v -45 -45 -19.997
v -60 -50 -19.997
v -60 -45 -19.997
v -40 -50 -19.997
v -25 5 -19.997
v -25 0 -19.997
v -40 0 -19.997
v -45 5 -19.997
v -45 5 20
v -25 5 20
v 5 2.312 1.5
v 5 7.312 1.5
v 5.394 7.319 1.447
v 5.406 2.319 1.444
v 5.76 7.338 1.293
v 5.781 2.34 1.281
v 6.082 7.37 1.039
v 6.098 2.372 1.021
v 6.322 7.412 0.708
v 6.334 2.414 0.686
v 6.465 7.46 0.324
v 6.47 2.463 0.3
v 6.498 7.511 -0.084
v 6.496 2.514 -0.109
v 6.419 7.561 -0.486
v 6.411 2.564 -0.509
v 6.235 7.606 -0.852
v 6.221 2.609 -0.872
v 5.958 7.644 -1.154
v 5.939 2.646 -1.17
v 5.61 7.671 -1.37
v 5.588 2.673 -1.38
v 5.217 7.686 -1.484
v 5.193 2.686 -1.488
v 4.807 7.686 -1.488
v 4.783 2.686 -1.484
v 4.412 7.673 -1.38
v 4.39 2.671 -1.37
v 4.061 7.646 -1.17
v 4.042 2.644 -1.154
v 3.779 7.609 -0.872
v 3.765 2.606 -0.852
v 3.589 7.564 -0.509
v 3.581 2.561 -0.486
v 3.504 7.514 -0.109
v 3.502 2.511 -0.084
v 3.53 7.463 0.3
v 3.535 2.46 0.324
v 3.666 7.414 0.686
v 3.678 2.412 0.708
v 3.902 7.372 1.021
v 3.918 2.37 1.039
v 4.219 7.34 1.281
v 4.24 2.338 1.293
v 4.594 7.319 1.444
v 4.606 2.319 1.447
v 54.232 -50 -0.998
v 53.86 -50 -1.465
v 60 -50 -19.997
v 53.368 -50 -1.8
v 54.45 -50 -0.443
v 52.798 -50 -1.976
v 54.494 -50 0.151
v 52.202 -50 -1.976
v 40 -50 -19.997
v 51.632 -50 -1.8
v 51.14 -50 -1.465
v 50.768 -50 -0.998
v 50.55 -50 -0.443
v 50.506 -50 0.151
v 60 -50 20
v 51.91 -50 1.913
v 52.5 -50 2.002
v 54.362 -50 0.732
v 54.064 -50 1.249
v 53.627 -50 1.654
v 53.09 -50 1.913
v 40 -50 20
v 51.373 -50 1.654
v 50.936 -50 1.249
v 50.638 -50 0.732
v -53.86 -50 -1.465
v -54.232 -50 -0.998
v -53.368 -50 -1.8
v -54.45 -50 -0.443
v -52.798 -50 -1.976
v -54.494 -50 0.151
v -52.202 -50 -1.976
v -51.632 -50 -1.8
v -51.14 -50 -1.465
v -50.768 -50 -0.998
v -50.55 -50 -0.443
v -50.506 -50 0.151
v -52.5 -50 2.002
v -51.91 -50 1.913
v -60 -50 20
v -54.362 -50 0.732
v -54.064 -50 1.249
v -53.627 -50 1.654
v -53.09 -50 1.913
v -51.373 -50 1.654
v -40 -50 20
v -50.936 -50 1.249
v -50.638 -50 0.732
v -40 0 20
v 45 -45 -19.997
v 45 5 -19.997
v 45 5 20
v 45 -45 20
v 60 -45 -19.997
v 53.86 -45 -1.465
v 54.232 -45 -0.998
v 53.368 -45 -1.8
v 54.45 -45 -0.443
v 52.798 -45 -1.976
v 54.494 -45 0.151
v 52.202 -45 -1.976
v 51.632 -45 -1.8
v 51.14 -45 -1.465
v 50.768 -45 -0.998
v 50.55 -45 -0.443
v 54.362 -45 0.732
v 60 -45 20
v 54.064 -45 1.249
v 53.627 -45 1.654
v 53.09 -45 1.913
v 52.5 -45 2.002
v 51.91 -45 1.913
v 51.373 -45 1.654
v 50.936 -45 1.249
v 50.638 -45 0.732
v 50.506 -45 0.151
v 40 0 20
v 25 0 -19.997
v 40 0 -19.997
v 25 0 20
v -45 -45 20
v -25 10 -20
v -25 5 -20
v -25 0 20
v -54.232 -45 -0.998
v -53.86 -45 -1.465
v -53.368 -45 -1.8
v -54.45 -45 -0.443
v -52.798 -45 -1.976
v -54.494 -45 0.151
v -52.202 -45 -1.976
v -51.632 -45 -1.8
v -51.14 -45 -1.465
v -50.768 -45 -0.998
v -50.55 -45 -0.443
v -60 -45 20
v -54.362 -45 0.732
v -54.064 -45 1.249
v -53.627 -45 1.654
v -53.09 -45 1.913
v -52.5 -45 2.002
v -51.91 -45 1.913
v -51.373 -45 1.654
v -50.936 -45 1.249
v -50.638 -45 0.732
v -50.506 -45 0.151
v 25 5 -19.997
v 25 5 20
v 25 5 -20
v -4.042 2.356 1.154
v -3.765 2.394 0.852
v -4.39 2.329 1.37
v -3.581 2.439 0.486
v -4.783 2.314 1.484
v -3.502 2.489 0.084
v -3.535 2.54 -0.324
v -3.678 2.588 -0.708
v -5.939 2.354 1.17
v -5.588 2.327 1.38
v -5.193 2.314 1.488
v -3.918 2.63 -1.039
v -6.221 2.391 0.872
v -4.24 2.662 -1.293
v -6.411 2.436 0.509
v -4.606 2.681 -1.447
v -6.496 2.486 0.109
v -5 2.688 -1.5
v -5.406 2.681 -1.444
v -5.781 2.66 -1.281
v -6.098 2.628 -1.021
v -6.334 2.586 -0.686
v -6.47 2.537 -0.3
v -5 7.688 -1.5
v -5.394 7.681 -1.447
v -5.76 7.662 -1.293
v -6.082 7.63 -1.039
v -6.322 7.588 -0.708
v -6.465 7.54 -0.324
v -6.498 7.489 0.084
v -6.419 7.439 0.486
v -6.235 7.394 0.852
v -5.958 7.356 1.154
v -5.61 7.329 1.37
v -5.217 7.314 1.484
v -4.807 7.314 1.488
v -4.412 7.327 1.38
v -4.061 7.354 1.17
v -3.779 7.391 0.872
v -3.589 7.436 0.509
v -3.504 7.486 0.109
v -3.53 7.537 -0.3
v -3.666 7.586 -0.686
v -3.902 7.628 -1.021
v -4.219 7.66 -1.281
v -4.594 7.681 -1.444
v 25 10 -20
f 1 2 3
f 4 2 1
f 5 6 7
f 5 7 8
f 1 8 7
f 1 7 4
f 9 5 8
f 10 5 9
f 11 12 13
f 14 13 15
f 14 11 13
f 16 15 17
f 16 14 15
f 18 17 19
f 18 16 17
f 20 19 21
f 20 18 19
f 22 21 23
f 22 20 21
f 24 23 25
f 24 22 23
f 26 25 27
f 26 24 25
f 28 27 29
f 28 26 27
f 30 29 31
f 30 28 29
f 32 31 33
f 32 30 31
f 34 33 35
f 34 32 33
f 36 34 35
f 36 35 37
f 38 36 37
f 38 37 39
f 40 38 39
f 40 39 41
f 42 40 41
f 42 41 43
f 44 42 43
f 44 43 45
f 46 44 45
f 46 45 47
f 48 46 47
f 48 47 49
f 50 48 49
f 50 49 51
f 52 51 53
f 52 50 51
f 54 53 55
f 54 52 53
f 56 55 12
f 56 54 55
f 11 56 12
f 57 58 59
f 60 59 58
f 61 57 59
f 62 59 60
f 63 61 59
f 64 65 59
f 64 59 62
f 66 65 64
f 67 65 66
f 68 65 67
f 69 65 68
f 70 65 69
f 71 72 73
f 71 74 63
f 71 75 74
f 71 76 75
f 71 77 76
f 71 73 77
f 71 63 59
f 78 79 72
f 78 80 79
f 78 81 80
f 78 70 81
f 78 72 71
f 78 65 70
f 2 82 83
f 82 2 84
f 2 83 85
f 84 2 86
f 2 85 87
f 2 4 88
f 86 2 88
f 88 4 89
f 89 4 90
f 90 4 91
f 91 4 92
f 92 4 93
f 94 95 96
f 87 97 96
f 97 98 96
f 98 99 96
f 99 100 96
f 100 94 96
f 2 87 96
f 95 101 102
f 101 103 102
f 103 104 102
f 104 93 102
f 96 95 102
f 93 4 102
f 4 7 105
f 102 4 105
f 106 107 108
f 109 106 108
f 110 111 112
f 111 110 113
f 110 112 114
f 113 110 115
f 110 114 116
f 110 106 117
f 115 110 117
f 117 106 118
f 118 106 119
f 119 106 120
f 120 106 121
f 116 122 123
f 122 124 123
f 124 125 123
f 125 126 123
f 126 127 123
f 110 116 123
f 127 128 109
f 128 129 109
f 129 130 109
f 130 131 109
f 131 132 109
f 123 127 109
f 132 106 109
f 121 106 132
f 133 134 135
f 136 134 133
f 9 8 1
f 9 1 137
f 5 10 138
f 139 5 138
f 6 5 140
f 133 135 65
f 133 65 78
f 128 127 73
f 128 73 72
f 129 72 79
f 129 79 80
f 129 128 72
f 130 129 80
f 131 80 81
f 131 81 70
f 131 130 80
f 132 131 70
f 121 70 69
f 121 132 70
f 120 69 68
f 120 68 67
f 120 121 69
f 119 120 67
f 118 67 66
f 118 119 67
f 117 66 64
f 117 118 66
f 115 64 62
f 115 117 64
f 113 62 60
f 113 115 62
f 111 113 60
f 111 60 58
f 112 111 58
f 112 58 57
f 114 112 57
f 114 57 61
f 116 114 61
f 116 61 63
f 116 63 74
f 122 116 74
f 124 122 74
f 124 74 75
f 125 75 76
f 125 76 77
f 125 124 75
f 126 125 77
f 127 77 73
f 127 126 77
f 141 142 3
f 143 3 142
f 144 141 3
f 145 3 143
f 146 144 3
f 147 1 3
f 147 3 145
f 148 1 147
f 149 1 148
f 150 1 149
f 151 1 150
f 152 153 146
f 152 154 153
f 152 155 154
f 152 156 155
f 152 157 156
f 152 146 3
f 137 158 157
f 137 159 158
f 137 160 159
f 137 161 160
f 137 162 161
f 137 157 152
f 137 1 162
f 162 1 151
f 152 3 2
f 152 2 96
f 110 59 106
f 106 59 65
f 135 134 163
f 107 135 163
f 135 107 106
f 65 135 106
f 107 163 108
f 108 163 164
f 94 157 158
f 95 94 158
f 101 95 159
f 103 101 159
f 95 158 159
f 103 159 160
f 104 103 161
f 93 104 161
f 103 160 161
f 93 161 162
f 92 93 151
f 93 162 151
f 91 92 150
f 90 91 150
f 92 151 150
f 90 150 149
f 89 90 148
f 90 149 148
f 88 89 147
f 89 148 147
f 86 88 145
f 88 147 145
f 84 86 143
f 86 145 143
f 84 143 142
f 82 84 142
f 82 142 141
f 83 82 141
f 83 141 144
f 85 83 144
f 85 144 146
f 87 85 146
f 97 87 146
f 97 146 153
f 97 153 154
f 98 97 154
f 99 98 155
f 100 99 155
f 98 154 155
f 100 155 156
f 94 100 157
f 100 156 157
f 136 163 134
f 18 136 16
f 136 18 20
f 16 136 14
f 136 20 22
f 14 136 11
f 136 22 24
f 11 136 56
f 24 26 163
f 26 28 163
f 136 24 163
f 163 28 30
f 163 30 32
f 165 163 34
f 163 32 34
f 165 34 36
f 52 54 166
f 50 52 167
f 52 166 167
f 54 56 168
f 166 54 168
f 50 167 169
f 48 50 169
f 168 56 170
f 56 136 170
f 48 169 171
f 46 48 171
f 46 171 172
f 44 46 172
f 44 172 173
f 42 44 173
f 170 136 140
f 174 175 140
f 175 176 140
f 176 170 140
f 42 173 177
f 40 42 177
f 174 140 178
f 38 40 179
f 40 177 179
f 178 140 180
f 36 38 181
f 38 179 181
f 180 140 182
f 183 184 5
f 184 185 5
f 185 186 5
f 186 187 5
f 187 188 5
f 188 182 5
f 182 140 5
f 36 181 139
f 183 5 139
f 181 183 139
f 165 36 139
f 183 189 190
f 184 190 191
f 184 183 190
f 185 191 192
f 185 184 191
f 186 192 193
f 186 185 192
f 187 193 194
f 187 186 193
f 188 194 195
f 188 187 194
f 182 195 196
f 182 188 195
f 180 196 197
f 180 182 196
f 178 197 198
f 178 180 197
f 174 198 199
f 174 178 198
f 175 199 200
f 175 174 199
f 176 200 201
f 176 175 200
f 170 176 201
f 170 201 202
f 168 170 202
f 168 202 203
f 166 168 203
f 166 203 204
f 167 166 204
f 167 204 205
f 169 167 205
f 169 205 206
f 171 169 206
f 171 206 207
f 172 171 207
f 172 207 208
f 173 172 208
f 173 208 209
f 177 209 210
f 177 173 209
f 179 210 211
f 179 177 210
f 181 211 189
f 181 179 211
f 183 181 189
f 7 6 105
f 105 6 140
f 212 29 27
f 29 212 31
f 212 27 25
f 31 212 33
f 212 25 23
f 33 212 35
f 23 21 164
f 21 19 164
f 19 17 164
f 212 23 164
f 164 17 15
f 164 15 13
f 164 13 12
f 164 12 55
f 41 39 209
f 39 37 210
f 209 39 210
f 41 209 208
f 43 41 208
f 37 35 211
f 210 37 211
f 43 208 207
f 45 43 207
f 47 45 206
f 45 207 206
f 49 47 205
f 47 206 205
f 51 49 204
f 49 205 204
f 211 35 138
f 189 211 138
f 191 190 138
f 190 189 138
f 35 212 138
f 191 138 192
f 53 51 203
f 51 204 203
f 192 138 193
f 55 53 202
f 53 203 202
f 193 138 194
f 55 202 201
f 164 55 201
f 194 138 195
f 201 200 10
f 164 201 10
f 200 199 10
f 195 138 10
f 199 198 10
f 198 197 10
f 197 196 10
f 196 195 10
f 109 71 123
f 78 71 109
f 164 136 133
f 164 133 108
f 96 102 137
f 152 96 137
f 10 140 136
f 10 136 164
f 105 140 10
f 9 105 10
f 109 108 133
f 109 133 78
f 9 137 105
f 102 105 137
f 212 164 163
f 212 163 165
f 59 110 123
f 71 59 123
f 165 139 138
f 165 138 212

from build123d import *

# Parameters (mm, degrees)
SKETCH1_W           = 50
SKETCH1_H           = 40
SKETCH1_R           = 1.5
BOSS_EXTRUDE1_DEPTH = 10
CUT_EXTRUDE2_DEPTH  = 50
SKETCH4_W           = 39.996802558
SKETCH4_H           = 5
BOSS_EXTRUDE2_DEPTH = 20
SKETCH5_W           = 5
SKETCH5_H           = 39.996802558
BOSS_EXTRUDE3_DEPTH = 50
SKETCH6_W           = 39.996802558
SKETCH6_H           = 5
BOSS_EXTRUDE4_DEPTH = 15
SKETCH9_R           = 2
CUT_EXTRUDE6_DEPTH  = 5


with BuildPart() as part:
    # Sketch1 → Boss-Extrude1 (new body)
    with BuildSketch(Plane(origin=(0, 0, 0), x_dir=(1, 0, 0), z_dir=(0, 1, 0))):
        Rectangle(SKETCH1_W, SKETCH1_H)
        with Locations(Location((5, 0, 0), (0, 0, 270))):
            Circle(SKETCH1_R, mode=Mode.SUBTRACT)
        with Locations(Location((-5, 0, 0), (0, 0, 90))):
            Circle(SKETCH1_R, mode=Mode.SUBTRACT)
    extrude(amount=BOSS_EXTRUDE1_DEPTH)

    # Sketch3 → Cut-Extrude2 (cut)
    with BuildSketch(Plane.ZY.offset(25)):
        Polygon((-20, 10), (20, 5), (20, 10), align=None)
        Polygon((20, 0), (-20, 5), (-20, 0), align=None)
    extrude(amount=-CUT_EXTRUDE2_DEPTH, mode=Mode.SUBTRACT)

    # Sketch4 → Boss-Extrude2 (add)
    with BuildSketch(Plane.ZY.offset(25)):
        with Locations((0.001598721, 2.5)):
            Rectangle(SKETCH4_W, SKETCH4_H)
    boss_extrude2 = extrude(amount=BOSS_EXTRUDE2_DEPTH)

    # Sketch5 → Boss-Extrude3 (add)
    with BuildSketch(Plane.XZ):
        with Locations((-42.5, 0.001598721)):
            Rectangle(SKETCH5_W, SKETCH5_H)
    boss_extrude3 = extrude(amount=BOSS_EXTRUDE3_DEPTH)

    # Sketch6 → Boss-Extrude4 (add)
    with BuildSketch(Plane.ZY.offset(45)):
        with Locations((0.001598721, -47.5)):
            Rectangle(SKETCH6_W, SKETCH6_H)
    boss_extrude4 = extrude(amount=BOSS_EXTRUDE4_DEPTH)

    # Sketch9 → Cut-Extrude6 (cut)
    with BuildSketch(Plane(origin=(0, -45, 0), x_dir=(1, 0, 0), z_dir=(0, 1, 0))):
        with Locations(Location((-52.5, -0.001598721, 0), (0, 0, 270))):
            Circle(SKETCH9_R)
    cut_extrude6 = extrude(amount=-CUT_EXTRUDE6_DEPTH, mode=Mode.SUBTRACT)

    # Mirror3: Boss-Extrude2, Boss-Extrude3, Boss-Extrude4, Cut-Extrude6 across plane
    add(boss_extrude2.mirror(Plane(origin=(0, 0, 0), x_dir=(0, 0, 1), z_dir=(1, 0, 0))))
    add(boss_extrude3.mirror(Plane(origin=(0, 0, 0), x_dir=(0, 0, 1), z_dir=(1, 0, 0))))
    add(boss_extrude4.mirror(Plane(origin=(0, 0, 0), x_dir=(0, 0, 1), z_dir=(1, 0, 0))))
    add(cut_extrude6.mirror(Plane(origin=(0, 0, 0), x_dir=(0, 0, 1), z_dir=(1, 0, 0))), mode=Mode.SUBTRACT)


solid = part.part
